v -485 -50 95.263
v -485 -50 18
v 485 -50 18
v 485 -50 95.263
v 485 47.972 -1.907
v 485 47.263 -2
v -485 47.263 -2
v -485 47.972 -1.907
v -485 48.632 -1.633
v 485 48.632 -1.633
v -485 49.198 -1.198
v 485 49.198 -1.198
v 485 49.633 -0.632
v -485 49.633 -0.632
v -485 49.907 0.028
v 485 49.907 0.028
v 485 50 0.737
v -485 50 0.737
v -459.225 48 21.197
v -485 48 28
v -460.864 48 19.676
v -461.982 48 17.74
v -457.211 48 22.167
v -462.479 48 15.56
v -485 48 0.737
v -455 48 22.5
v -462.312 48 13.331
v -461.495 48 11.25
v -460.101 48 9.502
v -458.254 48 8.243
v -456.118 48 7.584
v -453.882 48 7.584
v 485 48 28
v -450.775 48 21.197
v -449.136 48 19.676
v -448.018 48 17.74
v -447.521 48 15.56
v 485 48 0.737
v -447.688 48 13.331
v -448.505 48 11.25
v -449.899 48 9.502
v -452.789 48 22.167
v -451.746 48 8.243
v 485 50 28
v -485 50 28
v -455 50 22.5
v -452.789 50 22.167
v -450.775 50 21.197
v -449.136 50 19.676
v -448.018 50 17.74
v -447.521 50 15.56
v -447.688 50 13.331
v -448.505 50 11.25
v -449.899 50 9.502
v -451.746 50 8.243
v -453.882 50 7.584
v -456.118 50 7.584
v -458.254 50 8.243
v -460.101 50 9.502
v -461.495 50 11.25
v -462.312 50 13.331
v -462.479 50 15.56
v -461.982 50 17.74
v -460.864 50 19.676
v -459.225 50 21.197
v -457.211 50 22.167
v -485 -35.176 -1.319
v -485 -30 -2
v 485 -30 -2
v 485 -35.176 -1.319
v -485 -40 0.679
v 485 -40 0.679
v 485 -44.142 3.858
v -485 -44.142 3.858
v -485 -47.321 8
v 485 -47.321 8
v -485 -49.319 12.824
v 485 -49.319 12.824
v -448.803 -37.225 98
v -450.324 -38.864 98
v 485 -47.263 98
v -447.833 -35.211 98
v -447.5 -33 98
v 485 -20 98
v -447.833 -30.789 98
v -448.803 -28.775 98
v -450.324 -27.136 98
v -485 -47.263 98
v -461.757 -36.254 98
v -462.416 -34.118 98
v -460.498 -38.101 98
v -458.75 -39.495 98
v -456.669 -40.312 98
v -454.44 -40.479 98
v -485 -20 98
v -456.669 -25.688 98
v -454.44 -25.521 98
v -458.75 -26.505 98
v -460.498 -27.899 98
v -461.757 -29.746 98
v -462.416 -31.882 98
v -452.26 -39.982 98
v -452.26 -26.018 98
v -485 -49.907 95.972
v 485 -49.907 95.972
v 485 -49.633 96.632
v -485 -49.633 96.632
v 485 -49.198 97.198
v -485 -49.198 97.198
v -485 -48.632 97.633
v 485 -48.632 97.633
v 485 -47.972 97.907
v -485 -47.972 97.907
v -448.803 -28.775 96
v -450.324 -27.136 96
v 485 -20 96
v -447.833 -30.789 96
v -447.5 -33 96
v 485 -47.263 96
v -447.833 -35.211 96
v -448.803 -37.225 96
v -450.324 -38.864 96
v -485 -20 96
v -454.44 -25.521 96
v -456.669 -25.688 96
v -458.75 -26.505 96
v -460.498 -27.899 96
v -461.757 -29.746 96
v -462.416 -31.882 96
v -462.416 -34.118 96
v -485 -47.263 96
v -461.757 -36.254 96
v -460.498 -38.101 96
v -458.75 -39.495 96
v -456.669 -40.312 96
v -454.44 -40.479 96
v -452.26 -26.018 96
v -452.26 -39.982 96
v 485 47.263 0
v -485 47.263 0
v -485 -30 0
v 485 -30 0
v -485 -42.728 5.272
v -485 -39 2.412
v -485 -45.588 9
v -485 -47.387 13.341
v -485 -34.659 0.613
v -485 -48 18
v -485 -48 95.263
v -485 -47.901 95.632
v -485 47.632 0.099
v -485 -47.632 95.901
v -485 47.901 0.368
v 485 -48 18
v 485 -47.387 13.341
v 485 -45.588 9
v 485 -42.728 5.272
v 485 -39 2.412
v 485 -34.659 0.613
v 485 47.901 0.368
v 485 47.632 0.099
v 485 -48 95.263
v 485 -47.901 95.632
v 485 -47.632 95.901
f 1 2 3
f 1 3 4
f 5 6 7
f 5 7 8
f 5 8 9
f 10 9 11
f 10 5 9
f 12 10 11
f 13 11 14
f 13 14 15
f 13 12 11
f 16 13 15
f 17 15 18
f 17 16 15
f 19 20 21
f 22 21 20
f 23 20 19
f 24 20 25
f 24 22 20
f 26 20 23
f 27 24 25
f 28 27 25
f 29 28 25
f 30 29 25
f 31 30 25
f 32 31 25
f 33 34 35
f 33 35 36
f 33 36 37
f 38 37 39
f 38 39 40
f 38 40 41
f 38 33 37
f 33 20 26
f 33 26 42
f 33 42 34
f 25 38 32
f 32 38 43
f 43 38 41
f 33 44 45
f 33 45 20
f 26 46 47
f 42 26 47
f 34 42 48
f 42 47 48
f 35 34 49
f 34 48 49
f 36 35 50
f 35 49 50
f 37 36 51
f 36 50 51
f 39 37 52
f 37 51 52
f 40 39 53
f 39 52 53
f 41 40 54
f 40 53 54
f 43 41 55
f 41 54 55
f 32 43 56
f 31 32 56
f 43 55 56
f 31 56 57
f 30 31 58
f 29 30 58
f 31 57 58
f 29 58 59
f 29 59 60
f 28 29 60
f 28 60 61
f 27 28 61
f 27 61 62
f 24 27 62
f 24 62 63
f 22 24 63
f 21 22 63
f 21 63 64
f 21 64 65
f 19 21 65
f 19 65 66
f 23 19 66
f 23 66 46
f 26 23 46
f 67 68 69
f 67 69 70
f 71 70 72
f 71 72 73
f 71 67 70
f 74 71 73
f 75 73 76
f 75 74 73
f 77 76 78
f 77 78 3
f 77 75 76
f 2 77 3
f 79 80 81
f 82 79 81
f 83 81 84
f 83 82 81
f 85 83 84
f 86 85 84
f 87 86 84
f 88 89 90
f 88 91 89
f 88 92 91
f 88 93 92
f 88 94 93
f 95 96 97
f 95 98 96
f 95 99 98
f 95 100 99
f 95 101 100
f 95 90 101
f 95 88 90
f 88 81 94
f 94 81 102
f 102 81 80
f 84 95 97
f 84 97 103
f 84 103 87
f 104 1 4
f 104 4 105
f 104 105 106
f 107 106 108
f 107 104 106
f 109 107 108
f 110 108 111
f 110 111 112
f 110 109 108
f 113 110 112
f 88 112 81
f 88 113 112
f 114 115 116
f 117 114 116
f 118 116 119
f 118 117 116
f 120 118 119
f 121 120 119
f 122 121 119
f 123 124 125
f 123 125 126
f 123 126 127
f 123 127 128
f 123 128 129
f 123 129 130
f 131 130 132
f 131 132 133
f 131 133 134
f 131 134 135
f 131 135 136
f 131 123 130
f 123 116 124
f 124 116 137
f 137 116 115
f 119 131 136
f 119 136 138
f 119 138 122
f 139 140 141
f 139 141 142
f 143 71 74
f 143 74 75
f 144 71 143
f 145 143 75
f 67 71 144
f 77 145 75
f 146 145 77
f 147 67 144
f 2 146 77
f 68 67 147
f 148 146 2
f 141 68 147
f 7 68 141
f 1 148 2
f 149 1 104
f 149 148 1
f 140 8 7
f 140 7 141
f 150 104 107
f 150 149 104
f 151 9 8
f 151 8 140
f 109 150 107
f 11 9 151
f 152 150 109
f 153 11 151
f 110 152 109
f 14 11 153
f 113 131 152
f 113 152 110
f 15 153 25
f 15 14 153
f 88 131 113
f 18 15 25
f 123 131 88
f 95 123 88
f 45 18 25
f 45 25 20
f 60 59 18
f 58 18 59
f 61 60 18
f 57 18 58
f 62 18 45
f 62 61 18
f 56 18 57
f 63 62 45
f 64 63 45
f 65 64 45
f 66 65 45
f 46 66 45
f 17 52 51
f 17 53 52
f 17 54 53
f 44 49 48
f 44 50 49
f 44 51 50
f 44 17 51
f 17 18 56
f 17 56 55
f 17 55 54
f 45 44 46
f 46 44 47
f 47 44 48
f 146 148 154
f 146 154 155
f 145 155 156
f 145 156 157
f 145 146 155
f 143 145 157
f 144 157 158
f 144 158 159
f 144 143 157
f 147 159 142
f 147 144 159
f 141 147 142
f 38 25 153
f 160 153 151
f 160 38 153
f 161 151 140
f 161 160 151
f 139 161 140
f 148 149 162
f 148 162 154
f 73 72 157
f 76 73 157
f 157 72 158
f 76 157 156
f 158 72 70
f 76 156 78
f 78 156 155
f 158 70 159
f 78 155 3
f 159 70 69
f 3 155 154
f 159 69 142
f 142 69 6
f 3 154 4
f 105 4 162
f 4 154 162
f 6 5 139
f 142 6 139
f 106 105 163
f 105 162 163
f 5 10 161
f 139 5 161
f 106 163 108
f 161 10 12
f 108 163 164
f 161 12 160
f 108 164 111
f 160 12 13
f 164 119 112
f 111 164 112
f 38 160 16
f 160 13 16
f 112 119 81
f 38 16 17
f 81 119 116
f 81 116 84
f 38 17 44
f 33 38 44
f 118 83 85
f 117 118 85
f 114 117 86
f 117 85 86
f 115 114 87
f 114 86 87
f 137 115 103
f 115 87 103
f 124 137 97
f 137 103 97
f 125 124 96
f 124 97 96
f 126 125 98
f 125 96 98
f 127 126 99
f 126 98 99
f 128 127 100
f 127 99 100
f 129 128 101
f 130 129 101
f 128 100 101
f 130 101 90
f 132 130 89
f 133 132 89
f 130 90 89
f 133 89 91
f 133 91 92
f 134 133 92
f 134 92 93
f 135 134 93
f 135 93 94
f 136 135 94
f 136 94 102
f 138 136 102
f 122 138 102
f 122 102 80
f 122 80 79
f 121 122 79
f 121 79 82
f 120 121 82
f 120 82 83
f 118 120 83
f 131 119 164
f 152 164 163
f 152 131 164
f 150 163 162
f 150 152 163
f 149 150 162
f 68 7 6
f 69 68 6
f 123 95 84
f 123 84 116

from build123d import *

# Parameters (mm, degrees)
SKETCH_2_W                       = 970
SKETCH_2_H                       = 100
SM_BASE_FLANGE_1_DEPTH           = 2
SM_EDGE_FLANGE_1_STRIP_W         = 44
SM_EDGE_FLANGE_1_STRIP_H         = 2
SM_EDGE_FLANGE_1_STRIP_CUT_DEPTH = 970
SM_EDGE_FLANGE_1_DEPTH           = 970
SM_EDGE_FLANGE_2_STRIP_W         = 9.4732
SM_EDGE_FLANGE_2_STRIP_H         = 2
SM_EDGE_FLANGE_2_STRIP_CUT_DEPTH = 970
SM_EDGE_FLANGE_2_DEPTH           = 970
SM_EDGE_FLANGE_3_STRIP_W         = 9.4732
SM_EDGE_FLANGE_3_STRIP_H         = 2
SM_EDGE_FLANGE_3_STRIP_CUT_DEPTH = 970
SM_EDGE_FLANGE_3_DEPTH           = 970
SKETCH_16_R                      = 7.5
CUT_EXTRUDE_1_DEPTH              = 10
SKETCH_17_R                      = 7.5
CUT_EXTRUDE_2_DEPTH              = 10


# Sheet-metal steps are written as plain solids
with BuildPart() as part:
    # Sketch 2 → 基体-法兰1 (new body)
    with BuildSketch(Plane.XY):
        Rectangle(SKETCH_2_W, SKETCH_2_H)
    extrude(amount=-SM_BASE_FLANGE_1_DEPTH)

    # 边线-法兰1 strip (across the edge) → 边线-法兰1 strip cut (cut)
    with BuildSketch(Plane(origin=(-485, -50, 0), x_dir=(0, 1, 0), z_dir=(1, 0, 0))):
        with Locations((-2, -1)):
            Rectangle(SM_EDGE_FLANGE_1_STRIP_W, SM_EDGE_FLANGE_1_STRIP_H)
    extrude(amount=SM_EDGE_FLANGE_1_STRIP_CUT_DEPTH, mode=Mode.SUBTRACT)

    # 边线-法兰1 section (across the edge) → 边线-法兰1 (add)
    with BuildSketch(Plane(origin=(-485, -50, 0), x_dir=(0, 1, 0), z_dir=(1, 0, 0))):
        with BuildLine():
            Line((0, 18), (0, 98))
            Line((0, 98), (2, 98))
            Line((2, 98), (2, 18))
            ThreePointArc((2, 18), (7.272077939, 5.272077939), (20, 0))
            Line((20, 0), (20, -2))
            ThreePointArc((20, -2), (5.857864376, 3.857864376), (0, 18))
        make_face()
    extrude(amount=SM_EDGE_FLANGE_1_DEPTH)

    # 边线-法兰2 strip (across the edge) → 边线-法兰2 strip cut (cut)
    with BuildSketch(Plane(origin=(485, 50, 0), x_dir=(0, -1, 0), z_dir=(-1, 0, 0))):
        with Locations((-2, -1)):
            Rectangle(SM_EDGE_FLANGE_2_STRIP_W, SM_EDGE_FLANGE_2_STRIP_H)
    extrude(amount=SM_EDGE_FLANGE_2_STRIP_CUT_DEPTH, mode=Mode.SUBTRACT)

    # 边线-法兰2 section (across the edge) → 边线-法兰2 (add)
    with BuildSketch(Plane(origin=(485, 50, 0), x_dir=(0, -1, 0), z_dir=(-1, 0, 0))):
        with BuildLine():
            Line((0, 0.7366), (0, 28))
            Line((0, 28), (2, 28))
            Line((2, 28), (2, 0.7366))
            ThreePointArc((2, 0.7366), (2.215745145, 0.215745145), (2.7366, 0))
            Line((2.7366, 0), (2.7366, -2))
            ThreePointArc((2.7366, -2), (0.801531583, -1.198468417), (0, 0.7366))
        make_face()
    extrude(amount=SM_EDGE_FLANGE_2_DEPTH)

    # 边线-法兰3 strip (across the edge) → 边线-法兰3 strip cut (cut)
    with BuildSketch(Plane(origin=(-485, -48, 98), x_dir=(0, 0, -1), z_dir=(1, 0, 0))):
        with Locations((-2, -1)):
            Rectangle(SM_EDGE_FLANGE_3_STRIP_W, SM_EDGE_FLANGE_3_STRIP_H)
    extrude(amount=SM_EDGE_FLANGE_3_STRIP_CUT_DEPTH, mode=Mode.SUBTRACT)

    # 边线-法兰3 section (across the edge) → 边线-法兰3 (add)
    with BuildSketch(Plane(origin=(-485, -48, 98), x_dir=(0, 0, -1), z_dir=(1, 0, 0))):
        with BuildLine():
            Line((0, 0.7366), (0, 28))
            Line((0, 28), (2, 28))
            Line((2, 28), (2, 0.7366))
            ThreePointArc((2, 0.7366), (2.215745145, 0.215745145), (2.7366, 0))
            Line((2.7366, 0), (2.7366, -2))
            ThreePointArc((2.7366, -2), (0.801531583, -1.198468417), (0, 0.7366))
        make_face()
    extrude(amount=SM_EDGE_FLANGE_3_DEPTH)

    # 草图16 → 切除-拉伸1 (cut)
    with BuildSketch(Plane(origin=(0, 50, 0), x_dir=(1, 0, 0), z_dir=(0, 1, 0))):
        with Locations(Location((-455, -15, 0), (0, 0, 270))):
            Circle(SKETCH_16_R)
    extrude(amount=-CUT_EXTRUDE_1_DEPTH, mode=Mode.SUBTRACT)

    # 草图17 → 切除-拉伸2 (cut)
    with BuildSketch(Plane.XY.offset(98)):
        with Locations((-455, -33)):
            Circle(SKETCH_17_R)
    extrude(amount=-CUT_EXTRUDE_2_DEPTH, mode=Mode.SUBTRACT)


solid = part.part
